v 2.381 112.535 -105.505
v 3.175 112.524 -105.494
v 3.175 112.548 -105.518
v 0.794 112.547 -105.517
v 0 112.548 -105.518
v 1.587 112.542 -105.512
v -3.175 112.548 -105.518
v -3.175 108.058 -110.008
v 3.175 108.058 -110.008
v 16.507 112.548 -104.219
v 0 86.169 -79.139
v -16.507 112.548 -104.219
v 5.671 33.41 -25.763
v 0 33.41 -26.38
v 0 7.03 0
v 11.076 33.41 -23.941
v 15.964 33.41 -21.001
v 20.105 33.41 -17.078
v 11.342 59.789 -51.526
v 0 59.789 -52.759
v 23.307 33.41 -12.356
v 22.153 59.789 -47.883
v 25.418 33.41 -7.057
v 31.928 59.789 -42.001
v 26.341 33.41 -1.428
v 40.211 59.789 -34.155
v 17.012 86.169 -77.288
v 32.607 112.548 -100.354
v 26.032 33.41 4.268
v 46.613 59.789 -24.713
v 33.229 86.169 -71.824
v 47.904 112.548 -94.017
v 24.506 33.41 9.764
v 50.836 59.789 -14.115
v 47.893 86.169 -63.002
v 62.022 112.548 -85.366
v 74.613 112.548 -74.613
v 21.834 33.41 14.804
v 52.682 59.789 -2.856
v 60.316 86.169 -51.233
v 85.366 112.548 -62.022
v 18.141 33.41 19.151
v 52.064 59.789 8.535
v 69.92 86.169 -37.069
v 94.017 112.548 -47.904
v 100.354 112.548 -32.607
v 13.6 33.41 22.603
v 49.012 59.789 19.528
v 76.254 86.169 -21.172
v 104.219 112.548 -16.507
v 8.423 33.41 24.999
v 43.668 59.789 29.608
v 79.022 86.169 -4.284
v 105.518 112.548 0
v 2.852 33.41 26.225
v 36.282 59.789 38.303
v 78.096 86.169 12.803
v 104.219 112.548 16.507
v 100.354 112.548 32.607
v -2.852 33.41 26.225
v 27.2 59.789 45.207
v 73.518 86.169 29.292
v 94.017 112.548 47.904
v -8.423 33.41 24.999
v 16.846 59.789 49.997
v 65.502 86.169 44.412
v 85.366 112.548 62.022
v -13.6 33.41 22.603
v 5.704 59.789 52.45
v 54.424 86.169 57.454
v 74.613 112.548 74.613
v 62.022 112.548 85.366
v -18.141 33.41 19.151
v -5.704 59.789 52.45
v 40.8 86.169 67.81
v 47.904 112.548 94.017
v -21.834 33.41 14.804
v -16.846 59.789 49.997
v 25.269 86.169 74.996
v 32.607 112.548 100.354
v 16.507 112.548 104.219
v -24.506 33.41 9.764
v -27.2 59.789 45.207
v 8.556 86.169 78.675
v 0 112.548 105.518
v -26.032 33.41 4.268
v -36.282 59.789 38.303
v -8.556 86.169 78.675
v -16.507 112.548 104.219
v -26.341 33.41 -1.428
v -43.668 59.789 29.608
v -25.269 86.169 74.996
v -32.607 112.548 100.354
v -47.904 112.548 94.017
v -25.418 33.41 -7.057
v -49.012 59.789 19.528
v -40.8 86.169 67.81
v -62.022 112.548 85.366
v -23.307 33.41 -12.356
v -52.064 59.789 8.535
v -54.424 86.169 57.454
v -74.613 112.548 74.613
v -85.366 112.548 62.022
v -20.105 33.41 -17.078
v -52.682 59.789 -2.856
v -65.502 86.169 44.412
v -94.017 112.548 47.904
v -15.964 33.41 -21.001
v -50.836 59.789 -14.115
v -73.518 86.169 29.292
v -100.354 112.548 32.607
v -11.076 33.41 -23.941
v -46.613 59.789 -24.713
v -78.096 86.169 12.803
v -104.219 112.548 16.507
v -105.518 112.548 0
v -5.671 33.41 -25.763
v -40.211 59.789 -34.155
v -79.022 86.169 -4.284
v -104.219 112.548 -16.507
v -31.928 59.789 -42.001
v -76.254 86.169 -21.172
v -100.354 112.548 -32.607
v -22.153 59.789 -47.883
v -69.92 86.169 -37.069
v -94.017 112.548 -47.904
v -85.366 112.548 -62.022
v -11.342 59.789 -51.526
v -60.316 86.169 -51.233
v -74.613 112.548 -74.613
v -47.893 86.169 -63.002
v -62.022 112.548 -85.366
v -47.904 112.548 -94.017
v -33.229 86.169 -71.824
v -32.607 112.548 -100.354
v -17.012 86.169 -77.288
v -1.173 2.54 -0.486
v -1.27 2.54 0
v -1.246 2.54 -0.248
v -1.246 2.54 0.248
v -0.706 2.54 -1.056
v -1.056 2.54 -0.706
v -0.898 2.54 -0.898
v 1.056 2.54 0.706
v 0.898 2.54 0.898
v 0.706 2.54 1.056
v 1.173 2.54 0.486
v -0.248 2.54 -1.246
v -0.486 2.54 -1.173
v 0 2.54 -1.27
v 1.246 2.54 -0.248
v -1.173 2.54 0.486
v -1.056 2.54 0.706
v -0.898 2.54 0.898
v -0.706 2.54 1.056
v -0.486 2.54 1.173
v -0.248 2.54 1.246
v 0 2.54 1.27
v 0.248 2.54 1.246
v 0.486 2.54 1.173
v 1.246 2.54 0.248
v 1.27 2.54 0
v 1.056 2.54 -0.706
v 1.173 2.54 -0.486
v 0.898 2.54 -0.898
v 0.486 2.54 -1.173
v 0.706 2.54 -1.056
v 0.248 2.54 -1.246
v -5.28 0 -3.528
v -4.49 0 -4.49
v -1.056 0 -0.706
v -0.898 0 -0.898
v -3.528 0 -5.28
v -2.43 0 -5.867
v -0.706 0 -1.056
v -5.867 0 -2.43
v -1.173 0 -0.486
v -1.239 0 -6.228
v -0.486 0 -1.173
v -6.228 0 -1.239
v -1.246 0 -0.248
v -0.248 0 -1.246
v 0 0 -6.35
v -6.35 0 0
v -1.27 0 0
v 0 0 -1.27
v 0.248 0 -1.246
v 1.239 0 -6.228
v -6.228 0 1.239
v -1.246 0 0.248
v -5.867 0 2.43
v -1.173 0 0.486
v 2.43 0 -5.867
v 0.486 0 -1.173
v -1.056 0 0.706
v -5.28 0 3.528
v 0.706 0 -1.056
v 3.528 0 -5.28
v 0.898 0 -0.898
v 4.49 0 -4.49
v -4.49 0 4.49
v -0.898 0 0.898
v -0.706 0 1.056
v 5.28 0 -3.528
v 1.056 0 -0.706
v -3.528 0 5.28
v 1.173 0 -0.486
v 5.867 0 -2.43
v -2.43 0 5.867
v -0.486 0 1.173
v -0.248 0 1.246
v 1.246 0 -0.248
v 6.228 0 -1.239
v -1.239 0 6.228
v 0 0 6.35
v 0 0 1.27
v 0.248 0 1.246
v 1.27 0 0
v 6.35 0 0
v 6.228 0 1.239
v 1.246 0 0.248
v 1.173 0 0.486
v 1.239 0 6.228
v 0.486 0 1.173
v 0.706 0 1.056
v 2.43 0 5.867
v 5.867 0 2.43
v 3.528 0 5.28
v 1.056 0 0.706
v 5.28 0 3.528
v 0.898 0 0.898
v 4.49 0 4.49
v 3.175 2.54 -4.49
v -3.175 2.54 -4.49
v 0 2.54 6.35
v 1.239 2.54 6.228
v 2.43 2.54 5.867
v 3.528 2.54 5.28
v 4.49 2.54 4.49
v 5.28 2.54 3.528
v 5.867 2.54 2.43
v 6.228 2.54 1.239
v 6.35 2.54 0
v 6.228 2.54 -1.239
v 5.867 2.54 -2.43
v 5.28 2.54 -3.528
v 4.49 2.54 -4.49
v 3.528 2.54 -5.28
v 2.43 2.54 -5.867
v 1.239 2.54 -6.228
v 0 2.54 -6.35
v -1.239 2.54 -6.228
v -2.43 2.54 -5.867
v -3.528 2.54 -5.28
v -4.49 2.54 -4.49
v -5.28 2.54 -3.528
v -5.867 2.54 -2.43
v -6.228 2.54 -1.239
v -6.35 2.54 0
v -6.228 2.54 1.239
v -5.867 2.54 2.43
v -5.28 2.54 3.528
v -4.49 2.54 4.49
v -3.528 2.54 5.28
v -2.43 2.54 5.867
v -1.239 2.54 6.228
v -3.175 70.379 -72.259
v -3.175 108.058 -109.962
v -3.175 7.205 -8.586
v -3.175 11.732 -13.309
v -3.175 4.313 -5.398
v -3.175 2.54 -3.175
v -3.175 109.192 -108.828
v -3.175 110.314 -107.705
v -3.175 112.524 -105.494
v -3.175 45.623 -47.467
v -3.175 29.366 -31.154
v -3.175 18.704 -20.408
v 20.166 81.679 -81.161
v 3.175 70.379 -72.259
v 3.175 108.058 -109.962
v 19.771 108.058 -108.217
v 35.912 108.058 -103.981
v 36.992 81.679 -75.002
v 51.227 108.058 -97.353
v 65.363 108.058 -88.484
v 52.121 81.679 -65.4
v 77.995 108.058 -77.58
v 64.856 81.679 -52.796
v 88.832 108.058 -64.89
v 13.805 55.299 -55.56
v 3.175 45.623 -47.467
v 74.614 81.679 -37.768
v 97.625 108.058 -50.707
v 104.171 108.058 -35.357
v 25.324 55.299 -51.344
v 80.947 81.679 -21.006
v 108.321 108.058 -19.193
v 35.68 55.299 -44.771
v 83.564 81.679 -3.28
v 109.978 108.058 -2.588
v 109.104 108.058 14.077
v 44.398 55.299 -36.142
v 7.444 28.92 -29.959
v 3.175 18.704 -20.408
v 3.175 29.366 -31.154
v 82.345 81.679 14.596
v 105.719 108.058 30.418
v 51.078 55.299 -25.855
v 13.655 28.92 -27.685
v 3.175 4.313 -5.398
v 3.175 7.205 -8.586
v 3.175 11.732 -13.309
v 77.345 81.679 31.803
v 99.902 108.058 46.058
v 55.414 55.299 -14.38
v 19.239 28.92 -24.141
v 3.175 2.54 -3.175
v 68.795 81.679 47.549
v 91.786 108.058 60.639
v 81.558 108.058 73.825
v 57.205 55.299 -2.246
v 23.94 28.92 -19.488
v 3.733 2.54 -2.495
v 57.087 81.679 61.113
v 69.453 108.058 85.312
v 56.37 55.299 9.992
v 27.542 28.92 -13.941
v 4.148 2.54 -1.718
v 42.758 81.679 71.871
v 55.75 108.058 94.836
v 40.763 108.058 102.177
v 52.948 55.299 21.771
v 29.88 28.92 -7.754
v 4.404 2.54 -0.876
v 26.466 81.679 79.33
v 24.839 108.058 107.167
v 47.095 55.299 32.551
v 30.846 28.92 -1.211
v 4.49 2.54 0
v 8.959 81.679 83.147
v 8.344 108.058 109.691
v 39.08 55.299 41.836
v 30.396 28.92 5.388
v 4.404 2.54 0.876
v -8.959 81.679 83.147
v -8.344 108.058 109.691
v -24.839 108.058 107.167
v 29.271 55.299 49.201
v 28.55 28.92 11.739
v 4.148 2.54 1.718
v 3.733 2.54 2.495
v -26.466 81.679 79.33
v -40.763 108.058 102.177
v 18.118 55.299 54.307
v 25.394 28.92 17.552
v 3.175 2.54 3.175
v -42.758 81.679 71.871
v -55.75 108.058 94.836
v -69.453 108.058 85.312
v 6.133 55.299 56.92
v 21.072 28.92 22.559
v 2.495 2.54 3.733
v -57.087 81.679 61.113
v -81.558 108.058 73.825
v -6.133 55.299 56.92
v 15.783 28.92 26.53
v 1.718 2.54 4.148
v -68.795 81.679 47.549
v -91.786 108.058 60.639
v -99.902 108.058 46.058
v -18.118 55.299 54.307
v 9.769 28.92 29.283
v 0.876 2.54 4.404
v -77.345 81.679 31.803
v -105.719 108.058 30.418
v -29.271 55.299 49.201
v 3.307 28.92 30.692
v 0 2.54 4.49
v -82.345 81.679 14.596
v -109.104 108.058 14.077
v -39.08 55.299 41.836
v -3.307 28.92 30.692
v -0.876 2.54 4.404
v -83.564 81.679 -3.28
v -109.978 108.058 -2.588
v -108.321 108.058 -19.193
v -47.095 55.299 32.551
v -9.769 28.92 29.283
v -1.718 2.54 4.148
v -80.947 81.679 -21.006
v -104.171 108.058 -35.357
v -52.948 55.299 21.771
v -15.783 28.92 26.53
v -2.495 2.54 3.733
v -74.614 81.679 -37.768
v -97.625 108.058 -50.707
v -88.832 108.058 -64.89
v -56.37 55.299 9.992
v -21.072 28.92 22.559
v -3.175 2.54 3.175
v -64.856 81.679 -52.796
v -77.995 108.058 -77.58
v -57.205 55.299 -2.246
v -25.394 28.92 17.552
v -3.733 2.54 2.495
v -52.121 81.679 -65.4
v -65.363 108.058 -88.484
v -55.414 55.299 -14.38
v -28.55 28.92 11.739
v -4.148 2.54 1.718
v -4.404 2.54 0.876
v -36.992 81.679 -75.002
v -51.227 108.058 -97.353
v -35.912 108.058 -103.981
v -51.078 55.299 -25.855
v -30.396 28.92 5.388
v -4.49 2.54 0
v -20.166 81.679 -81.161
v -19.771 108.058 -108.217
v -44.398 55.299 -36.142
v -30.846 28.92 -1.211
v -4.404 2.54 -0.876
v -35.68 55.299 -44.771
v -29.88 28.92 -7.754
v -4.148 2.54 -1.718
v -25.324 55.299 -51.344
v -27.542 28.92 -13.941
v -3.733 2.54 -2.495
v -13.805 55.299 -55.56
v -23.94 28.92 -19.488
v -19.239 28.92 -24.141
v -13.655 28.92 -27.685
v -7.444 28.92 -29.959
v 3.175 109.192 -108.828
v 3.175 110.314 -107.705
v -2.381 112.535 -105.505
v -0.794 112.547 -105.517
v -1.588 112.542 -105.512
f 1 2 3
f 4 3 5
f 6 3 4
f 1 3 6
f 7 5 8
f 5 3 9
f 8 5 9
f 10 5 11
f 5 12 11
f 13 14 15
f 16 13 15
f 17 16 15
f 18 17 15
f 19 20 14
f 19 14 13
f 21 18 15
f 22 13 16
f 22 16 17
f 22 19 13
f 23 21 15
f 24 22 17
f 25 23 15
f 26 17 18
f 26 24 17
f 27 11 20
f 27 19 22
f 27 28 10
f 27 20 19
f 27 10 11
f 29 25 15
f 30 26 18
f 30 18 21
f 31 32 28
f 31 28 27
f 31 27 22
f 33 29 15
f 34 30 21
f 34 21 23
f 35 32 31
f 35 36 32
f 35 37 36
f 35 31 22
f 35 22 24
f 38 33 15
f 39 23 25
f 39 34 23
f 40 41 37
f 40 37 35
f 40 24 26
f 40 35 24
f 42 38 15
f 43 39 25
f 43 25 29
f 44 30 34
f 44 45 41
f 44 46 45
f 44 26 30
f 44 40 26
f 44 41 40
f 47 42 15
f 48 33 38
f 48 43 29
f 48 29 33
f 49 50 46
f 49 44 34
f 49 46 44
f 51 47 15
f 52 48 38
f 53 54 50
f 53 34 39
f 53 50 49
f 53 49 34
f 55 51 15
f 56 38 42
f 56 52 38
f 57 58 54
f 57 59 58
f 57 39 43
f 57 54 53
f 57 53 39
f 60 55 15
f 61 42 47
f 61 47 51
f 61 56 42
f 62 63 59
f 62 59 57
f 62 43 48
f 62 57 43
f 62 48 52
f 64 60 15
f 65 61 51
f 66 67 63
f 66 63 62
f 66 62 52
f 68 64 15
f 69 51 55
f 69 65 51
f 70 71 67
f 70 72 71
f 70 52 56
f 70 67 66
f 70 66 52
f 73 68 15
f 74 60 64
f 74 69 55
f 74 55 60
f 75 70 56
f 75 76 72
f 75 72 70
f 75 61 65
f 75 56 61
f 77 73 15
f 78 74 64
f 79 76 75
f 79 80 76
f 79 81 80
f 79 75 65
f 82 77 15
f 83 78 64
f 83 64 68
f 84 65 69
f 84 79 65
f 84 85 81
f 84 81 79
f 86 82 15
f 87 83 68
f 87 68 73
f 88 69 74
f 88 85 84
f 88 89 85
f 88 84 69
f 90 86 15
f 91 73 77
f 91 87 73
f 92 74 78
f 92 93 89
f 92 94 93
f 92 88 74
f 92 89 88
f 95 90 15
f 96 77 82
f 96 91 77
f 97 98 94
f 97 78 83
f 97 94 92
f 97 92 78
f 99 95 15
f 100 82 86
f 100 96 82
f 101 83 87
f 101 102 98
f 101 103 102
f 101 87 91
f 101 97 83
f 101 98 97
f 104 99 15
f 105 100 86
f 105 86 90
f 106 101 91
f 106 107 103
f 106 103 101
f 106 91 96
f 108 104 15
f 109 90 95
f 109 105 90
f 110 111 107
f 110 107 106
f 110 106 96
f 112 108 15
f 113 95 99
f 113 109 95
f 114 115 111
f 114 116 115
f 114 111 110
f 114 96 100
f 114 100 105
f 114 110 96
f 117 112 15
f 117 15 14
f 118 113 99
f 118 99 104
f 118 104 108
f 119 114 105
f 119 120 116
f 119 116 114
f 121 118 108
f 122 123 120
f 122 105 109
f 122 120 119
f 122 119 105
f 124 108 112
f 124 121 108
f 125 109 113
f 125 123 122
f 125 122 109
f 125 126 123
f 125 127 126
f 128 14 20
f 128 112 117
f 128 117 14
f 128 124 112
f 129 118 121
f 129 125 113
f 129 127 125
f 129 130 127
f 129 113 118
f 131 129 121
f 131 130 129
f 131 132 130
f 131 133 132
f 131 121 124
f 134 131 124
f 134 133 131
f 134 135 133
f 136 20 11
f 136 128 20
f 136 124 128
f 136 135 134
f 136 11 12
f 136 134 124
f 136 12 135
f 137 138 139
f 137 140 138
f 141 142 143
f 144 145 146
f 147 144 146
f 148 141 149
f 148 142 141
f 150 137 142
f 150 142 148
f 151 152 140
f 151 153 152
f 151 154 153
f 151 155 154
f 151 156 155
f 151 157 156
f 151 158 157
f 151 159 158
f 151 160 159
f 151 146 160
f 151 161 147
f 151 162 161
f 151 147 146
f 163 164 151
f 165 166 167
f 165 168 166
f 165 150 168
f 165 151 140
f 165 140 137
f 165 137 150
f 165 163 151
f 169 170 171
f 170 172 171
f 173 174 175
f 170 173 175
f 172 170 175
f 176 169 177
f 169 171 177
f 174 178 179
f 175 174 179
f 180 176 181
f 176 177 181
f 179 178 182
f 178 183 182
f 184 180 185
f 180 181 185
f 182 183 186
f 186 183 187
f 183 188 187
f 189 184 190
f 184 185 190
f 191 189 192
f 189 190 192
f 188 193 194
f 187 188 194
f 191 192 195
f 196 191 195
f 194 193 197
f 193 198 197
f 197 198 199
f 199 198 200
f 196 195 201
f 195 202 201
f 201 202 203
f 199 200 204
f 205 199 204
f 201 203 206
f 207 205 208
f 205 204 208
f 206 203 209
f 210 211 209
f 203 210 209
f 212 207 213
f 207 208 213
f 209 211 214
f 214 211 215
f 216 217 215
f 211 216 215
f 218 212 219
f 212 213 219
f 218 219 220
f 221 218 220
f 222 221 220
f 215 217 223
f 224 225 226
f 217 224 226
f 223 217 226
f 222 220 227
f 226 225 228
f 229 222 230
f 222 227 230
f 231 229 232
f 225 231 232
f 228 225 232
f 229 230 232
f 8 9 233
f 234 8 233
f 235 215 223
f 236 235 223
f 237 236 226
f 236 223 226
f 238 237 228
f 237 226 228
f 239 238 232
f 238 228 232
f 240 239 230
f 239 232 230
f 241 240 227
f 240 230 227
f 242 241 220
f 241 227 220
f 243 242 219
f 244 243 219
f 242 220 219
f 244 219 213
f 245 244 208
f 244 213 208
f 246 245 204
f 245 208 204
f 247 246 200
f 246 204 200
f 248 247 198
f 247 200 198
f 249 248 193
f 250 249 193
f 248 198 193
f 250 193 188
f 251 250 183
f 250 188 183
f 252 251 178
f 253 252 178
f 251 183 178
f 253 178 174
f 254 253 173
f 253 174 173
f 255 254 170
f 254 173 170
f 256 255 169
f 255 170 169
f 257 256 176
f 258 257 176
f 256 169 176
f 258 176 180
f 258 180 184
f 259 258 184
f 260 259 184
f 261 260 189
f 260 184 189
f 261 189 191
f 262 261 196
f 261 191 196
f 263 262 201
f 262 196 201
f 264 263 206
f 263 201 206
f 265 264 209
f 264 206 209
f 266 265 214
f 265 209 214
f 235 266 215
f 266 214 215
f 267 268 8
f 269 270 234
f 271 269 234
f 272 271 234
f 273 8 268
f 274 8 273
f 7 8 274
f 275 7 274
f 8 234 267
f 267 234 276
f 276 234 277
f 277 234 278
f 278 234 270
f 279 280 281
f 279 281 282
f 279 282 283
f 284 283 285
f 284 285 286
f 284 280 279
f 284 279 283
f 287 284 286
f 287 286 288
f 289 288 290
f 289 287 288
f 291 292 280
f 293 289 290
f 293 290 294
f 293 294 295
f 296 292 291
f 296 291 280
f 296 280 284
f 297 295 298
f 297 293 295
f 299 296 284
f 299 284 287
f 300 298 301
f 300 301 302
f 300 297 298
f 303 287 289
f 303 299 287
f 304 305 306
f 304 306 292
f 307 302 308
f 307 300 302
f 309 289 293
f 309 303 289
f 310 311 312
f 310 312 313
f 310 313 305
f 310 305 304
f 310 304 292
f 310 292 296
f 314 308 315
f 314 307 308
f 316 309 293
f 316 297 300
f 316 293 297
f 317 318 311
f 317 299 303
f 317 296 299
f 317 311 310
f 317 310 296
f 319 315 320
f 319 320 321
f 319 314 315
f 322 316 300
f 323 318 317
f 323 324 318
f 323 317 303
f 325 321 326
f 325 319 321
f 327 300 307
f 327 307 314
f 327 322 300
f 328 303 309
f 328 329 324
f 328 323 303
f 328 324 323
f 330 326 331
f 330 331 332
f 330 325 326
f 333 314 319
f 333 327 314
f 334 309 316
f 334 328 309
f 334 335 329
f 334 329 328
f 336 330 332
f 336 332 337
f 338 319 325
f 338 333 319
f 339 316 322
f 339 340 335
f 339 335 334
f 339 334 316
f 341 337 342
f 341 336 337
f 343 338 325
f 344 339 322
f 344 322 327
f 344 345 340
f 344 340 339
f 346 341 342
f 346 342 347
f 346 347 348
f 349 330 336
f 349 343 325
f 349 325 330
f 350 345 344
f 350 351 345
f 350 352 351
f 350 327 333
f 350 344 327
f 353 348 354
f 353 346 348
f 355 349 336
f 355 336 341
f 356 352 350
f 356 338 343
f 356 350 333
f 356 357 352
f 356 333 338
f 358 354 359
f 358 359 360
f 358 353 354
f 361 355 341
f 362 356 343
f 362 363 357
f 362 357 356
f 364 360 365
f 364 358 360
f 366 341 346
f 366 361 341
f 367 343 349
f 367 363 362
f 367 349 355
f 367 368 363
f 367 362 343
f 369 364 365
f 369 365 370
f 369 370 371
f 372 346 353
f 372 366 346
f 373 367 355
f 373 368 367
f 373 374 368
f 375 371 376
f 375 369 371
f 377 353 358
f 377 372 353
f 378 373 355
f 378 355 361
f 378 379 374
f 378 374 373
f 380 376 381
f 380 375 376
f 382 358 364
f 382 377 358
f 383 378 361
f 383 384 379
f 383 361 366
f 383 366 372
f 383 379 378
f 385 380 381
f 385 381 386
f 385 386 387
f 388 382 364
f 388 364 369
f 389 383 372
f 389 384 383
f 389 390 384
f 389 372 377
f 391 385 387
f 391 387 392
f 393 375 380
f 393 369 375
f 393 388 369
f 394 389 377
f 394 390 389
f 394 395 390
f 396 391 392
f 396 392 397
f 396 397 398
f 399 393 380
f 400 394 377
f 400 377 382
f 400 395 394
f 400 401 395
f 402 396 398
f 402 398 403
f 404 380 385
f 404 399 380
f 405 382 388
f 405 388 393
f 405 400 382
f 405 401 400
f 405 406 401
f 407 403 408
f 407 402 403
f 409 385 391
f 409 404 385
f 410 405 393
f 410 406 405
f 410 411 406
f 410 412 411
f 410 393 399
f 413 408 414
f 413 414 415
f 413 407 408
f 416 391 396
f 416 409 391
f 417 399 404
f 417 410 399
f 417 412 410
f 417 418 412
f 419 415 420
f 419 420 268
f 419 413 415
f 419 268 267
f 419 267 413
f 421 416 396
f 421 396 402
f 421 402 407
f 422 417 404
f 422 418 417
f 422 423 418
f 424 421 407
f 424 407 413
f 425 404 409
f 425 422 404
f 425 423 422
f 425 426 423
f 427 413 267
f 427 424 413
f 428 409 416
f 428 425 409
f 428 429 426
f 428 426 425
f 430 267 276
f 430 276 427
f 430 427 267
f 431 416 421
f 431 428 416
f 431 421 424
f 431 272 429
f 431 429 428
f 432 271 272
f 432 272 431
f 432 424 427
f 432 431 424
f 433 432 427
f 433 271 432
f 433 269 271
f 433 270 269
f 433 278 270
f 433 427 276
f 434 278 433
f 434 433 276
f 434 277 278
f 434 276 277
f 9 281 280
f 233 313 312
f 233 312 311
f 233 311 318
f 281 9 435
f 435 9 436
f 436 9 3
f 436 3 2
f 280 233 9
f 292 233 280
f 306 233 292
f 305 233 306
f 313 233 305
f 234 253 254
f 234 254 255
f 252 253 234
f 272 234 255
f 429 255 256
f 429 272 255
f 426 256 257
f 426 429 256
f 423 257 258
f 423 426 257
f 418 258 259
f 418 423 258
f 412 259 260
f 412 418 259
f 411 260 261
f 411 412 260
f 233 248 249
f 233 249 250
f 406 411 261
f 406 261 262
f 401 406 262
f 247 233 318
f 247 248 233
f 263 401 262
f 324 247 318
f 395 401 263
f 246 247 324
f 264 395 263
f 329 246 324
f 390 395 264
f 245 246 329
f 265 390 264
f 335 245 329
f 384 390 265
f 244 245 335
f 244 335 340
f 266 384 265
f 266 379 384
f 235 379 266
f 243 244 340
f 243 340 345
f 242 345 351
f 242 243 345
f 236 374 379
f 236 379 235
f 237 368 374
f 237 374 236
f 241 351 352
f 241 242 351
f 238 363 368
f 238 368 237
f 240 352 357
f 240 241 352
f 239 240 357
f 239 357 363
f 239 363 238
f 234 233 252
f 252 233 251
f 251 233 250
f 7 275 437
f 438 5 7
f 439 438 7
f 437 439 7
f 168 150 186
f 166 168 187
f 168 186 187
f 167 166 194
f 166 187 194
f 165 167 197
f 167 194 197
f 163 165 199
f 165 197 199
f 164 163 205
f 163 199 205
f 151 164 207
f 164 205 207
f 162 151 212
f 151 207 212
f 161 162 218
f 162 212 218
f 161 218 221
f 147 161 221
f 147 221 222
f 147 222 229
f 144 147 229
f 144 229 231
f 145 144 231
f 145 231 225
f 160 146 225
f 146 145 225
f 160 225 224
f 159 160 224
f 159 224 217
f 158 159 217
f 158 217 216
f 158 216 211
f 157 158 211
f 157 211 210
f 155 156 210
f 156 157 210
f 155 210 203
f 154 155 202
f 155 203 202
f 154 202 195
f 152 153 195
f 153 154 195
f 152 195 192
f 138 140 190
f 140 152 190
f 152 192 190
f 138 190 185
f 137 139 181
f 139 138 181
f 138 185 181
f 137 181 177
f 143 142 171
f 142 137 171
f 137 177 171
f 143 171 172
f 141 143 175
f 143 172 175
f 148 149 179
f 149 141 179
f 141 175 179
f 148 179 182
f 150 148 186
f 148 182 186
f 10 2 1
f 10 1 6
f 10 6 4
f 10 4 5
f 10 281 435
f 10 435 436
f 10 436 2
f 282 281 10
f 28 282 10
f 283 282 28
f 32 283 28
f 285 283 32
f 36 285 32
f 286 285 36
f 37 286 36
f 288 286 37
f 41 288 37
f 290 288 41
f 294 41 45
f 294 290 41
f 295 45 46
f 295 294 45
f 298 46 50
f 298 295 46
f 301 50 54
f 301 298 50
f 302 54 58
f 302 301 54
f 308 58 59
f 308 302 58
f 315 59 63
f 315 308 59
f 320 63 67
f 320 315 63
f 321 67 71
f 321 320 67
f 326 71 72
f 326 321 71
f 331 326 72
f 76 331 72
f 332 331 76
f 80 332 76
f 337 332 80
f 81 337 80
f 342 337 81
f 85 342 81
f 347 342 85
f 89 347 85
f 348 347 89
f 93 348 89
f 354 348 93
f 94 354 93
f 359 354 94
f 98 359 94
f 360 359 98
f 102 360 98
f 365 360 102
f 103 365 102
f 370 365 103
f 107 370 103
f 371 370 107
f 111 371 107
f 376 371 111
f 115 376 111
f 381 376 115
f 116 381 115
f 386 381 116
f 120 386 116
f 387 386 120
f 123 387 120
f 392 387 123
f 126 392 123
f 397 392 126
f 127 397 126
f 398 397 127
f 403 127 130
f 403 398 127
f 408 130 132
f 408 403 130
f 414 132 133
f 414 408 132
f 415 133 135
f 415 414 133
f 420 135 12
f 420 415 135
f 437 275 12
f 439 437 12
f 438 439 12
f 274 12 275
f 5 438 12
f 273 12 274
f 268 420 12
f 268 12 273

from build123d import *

# Parameters (mm, degrees)
SKETCH1_R           = 6.35
BOSS_EXTRUDE1_DEPTH = 2.54
BOSS_EXTRUDE2_DEPTH = 3.175
SKETCH3_R           = 1.27
CUT_EXTRUDE7_DEPTH  = 158.509352305


with BuildPart() as part:
    # Sketch1 → Boss-Extrude1 (new body)
    with BuildSketch(Plane(origin=(0, 0, 0), x_dir=(1, 0, 0), z_dir=(0, 1, 0))):
        Circle(SKETCH1_R)
    extrude(amount=BOSS_EXTRUDE1_DEPTH)

    # Sketch2 → Boss-Extrude2 (add, symmetric)
    with BuildSketch(Plane(origin=(0, 0, 0), x_dir=(0, 0, -1), z_dir=(1, 0, 0))):
        Polygon((105.518009423, 112.548137483), (110.008137483, 108.058009423), (4.490128061, 2.54), (0, 2.54), (0, 7.030128061), align=None)
    extrude(amount=BOSS_EXTRUDE2_DEPTH, both=True)

    # Sketch3 → Cut-Extrude7 (cut, through all)
    with BuildSketch(Plane.XZ):
        Circle(SKETCH3_R)
    extrude(amount=-CUT_EXTRUDE7_DEPTH, mode=Mode.SUBTRACT)

    # Sketch2<4> → Revolve3 (revolve)
    with BuildSketch(Plane(origin=(0, 0, 0), x_dir=(0, 0, -1), z_dir=(1, 0, 0))):
        Polygon((105.518009423, 112.548137483), (110.008137483, 108.058009423), (4.490128061, 2.54), (0, 2.54), (0, 7.030128061), align=None)
    revolve(axis=Axis((0, 2.54, 0), (0, -1, 0)))


solid = part.part
